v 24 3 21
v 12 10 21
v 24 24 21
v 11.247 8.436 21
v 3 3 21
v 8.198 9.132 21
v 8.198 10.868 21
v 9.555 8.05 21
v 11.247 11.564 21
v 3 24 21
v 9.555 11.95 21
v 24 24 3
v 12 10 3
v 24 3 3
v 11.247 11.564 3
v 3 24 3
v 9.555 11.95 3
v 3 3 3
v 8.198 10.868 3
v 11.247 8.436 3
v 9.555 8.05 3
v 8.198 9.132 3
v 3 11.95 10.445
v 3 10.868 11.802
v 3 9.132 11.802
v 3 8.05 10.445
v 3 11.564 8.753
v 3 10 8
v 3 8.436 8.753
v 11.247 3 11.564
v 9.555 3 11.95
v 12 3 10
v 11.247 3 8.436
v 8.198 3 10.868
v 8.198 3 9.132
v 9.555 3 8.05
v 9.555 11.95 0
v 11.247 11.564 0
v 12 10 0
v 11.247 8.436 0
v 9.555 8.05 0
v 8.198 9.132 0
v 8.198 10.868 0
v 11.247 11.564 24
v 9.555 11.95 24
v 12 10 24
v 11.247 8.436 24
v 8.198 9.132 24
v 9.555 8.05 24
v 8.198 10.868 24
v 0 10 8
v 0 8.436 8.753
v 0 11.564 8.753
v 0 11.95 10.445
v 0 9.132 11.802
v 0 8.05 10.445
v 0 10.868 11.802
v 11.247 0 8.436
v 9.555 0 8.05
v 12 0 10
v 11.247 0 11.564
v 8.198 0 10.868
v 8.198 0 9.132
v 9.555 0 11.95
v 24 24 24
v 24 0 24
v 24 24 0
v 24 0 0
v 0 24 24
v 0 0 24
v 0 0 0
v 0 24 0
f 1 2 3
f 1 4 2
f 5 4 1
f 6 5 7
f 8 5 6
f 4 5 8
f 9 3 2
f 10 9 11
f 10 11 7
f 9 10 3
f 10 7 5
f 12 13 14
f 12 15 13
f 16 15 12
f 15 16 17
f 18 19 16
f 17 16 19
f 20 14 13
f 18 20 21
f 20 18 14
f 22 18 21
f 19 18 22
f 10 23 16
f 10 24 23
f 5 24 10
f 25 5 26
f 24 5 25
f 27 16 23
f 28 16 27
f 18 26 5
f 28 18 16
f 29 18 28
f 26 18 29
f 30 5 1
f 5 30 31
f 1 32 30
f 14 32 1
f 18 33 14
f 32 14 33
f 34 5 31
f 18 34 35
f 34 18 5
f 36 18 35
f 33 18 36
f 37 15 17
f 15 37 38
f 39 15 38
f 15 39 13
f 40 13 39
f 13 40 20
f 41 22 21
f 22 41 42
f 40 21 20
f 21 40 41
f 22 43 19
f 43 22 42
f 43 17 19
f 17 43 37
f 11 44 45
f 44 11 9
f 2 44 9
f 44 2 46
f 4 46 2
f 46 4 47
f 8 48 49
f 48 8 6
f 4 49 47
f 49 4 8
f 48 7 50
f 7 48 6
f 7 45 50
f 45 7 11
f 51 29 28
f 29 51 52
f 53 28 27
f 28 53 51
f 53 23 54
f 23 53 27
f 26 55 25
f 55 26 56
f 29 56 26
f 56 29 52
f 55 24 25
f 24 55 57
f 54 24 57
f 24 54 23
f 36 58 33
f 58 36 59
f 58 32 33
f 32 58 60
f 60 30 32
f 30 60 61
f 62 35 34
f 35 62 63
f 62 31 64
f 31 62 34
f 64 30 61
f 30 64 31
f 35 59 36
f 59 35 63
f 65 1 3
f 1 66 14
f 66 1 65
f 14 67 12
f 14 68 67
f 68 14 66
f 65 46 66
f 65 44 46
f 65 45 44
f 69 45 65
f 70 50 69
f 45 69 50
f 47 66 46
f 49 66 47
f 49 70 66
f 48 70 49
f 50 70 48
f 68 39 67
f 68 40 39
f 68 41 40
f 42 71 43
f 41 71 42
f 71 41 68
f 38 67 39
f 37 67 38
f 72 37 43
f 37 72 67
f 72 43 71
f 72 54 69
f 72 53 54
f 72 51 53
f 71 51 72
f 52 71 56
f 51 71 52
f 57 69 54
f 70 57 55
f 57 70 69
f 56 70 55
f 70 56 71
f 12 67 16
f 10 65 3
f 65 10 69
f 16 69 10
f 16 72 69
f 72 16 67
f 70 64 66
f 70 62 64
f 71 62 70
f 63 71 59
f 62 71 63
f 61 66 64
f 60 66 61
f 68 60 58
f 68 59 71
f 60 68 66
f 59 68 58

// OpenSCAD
module custom_angle_bracket(
size=[0,0,0],
hole_diameter=4,
thickness=3,
bottom_hole_pos=[0,0],
top_hole_pos=[0,0],
left_hole_pos=[0,0],
front_hole_pos=[0,0]
)
{
    //size_x = size.x;
    //size_y = size.y;
    //size_z = size.z;
    echo("top_hole_pos",top_hole_pos);

    cond_x = (size.x<=0 && top_hole_pos.x>0);
    size_x = size.x>0? size.x : (bottom_hole_pos.x>0 ? bottom_hole_pos.x*2 : 0);
    echo(size_x);
    cond_y = size.y<=0 && bottom_hole_pos.y>0;
    size_y = size.x>0? size.x : (bottom_hole_pos.x>0 ? bottom_hole_pos.x*2 : 0);

    size_z= size.z;

    size=[size_x,size_y,size_z];
    echo(size);

    e=0.1; //epsilon margin
    difference()
    {
        union()
        {
            cube(size);
        }
        union()
        {
            //clearance
            translate([thickness, thickness, thickness])
            cube([size.x,size.y,size.z-2*thickness]);

            //bottom hole
            translate([bottom_hole_pos.x,bottom_hole_pos.y,-e])
            cylinder(h=thickness+2*e,d=hole_diameter);

            //top hole
            translate([top_hole_pos.x,top_hole_pos.y,size.z-thickness-e])
            cylinder(h=thickness+2*e,d=hole_diameter);

            //left hole
            translate([-e,left_hole_pos.x,left_hole_pos.y])
            rotate([0,90,0])
            cylinder(h=thickness+2*e,d=hole_diameter);

            //front hole
            translate([front_hole_pos.x,-e,front_hole_pos.y])
            rotate([-90,0,0])
            cylinder(h=thickness+2*e,d=hole_diameter);
        }
    }
}

size=[20,20,20];
thickness=3;
hole_diameter=4;
holes= [[10,10],[10,10],[10,10],[10,10]];

param =
[for(a=[[size,thickness,hole_diameter],holes]) for(b=a) b];
echo("param",param);

custom_angle_bracket(
    size=[24,24,24],
    hole_diameter=4,
    thickness=3,
    bottom_hole_pos=[10,10],
    top_hole_pos=[10,10],
    left_hole_pos=[10,10],
    front_hole_pos=[10,10]
)
    ;
//custom_angle_bracket(size=[20,20,20],bottom_hole_pos=[10,10]);
